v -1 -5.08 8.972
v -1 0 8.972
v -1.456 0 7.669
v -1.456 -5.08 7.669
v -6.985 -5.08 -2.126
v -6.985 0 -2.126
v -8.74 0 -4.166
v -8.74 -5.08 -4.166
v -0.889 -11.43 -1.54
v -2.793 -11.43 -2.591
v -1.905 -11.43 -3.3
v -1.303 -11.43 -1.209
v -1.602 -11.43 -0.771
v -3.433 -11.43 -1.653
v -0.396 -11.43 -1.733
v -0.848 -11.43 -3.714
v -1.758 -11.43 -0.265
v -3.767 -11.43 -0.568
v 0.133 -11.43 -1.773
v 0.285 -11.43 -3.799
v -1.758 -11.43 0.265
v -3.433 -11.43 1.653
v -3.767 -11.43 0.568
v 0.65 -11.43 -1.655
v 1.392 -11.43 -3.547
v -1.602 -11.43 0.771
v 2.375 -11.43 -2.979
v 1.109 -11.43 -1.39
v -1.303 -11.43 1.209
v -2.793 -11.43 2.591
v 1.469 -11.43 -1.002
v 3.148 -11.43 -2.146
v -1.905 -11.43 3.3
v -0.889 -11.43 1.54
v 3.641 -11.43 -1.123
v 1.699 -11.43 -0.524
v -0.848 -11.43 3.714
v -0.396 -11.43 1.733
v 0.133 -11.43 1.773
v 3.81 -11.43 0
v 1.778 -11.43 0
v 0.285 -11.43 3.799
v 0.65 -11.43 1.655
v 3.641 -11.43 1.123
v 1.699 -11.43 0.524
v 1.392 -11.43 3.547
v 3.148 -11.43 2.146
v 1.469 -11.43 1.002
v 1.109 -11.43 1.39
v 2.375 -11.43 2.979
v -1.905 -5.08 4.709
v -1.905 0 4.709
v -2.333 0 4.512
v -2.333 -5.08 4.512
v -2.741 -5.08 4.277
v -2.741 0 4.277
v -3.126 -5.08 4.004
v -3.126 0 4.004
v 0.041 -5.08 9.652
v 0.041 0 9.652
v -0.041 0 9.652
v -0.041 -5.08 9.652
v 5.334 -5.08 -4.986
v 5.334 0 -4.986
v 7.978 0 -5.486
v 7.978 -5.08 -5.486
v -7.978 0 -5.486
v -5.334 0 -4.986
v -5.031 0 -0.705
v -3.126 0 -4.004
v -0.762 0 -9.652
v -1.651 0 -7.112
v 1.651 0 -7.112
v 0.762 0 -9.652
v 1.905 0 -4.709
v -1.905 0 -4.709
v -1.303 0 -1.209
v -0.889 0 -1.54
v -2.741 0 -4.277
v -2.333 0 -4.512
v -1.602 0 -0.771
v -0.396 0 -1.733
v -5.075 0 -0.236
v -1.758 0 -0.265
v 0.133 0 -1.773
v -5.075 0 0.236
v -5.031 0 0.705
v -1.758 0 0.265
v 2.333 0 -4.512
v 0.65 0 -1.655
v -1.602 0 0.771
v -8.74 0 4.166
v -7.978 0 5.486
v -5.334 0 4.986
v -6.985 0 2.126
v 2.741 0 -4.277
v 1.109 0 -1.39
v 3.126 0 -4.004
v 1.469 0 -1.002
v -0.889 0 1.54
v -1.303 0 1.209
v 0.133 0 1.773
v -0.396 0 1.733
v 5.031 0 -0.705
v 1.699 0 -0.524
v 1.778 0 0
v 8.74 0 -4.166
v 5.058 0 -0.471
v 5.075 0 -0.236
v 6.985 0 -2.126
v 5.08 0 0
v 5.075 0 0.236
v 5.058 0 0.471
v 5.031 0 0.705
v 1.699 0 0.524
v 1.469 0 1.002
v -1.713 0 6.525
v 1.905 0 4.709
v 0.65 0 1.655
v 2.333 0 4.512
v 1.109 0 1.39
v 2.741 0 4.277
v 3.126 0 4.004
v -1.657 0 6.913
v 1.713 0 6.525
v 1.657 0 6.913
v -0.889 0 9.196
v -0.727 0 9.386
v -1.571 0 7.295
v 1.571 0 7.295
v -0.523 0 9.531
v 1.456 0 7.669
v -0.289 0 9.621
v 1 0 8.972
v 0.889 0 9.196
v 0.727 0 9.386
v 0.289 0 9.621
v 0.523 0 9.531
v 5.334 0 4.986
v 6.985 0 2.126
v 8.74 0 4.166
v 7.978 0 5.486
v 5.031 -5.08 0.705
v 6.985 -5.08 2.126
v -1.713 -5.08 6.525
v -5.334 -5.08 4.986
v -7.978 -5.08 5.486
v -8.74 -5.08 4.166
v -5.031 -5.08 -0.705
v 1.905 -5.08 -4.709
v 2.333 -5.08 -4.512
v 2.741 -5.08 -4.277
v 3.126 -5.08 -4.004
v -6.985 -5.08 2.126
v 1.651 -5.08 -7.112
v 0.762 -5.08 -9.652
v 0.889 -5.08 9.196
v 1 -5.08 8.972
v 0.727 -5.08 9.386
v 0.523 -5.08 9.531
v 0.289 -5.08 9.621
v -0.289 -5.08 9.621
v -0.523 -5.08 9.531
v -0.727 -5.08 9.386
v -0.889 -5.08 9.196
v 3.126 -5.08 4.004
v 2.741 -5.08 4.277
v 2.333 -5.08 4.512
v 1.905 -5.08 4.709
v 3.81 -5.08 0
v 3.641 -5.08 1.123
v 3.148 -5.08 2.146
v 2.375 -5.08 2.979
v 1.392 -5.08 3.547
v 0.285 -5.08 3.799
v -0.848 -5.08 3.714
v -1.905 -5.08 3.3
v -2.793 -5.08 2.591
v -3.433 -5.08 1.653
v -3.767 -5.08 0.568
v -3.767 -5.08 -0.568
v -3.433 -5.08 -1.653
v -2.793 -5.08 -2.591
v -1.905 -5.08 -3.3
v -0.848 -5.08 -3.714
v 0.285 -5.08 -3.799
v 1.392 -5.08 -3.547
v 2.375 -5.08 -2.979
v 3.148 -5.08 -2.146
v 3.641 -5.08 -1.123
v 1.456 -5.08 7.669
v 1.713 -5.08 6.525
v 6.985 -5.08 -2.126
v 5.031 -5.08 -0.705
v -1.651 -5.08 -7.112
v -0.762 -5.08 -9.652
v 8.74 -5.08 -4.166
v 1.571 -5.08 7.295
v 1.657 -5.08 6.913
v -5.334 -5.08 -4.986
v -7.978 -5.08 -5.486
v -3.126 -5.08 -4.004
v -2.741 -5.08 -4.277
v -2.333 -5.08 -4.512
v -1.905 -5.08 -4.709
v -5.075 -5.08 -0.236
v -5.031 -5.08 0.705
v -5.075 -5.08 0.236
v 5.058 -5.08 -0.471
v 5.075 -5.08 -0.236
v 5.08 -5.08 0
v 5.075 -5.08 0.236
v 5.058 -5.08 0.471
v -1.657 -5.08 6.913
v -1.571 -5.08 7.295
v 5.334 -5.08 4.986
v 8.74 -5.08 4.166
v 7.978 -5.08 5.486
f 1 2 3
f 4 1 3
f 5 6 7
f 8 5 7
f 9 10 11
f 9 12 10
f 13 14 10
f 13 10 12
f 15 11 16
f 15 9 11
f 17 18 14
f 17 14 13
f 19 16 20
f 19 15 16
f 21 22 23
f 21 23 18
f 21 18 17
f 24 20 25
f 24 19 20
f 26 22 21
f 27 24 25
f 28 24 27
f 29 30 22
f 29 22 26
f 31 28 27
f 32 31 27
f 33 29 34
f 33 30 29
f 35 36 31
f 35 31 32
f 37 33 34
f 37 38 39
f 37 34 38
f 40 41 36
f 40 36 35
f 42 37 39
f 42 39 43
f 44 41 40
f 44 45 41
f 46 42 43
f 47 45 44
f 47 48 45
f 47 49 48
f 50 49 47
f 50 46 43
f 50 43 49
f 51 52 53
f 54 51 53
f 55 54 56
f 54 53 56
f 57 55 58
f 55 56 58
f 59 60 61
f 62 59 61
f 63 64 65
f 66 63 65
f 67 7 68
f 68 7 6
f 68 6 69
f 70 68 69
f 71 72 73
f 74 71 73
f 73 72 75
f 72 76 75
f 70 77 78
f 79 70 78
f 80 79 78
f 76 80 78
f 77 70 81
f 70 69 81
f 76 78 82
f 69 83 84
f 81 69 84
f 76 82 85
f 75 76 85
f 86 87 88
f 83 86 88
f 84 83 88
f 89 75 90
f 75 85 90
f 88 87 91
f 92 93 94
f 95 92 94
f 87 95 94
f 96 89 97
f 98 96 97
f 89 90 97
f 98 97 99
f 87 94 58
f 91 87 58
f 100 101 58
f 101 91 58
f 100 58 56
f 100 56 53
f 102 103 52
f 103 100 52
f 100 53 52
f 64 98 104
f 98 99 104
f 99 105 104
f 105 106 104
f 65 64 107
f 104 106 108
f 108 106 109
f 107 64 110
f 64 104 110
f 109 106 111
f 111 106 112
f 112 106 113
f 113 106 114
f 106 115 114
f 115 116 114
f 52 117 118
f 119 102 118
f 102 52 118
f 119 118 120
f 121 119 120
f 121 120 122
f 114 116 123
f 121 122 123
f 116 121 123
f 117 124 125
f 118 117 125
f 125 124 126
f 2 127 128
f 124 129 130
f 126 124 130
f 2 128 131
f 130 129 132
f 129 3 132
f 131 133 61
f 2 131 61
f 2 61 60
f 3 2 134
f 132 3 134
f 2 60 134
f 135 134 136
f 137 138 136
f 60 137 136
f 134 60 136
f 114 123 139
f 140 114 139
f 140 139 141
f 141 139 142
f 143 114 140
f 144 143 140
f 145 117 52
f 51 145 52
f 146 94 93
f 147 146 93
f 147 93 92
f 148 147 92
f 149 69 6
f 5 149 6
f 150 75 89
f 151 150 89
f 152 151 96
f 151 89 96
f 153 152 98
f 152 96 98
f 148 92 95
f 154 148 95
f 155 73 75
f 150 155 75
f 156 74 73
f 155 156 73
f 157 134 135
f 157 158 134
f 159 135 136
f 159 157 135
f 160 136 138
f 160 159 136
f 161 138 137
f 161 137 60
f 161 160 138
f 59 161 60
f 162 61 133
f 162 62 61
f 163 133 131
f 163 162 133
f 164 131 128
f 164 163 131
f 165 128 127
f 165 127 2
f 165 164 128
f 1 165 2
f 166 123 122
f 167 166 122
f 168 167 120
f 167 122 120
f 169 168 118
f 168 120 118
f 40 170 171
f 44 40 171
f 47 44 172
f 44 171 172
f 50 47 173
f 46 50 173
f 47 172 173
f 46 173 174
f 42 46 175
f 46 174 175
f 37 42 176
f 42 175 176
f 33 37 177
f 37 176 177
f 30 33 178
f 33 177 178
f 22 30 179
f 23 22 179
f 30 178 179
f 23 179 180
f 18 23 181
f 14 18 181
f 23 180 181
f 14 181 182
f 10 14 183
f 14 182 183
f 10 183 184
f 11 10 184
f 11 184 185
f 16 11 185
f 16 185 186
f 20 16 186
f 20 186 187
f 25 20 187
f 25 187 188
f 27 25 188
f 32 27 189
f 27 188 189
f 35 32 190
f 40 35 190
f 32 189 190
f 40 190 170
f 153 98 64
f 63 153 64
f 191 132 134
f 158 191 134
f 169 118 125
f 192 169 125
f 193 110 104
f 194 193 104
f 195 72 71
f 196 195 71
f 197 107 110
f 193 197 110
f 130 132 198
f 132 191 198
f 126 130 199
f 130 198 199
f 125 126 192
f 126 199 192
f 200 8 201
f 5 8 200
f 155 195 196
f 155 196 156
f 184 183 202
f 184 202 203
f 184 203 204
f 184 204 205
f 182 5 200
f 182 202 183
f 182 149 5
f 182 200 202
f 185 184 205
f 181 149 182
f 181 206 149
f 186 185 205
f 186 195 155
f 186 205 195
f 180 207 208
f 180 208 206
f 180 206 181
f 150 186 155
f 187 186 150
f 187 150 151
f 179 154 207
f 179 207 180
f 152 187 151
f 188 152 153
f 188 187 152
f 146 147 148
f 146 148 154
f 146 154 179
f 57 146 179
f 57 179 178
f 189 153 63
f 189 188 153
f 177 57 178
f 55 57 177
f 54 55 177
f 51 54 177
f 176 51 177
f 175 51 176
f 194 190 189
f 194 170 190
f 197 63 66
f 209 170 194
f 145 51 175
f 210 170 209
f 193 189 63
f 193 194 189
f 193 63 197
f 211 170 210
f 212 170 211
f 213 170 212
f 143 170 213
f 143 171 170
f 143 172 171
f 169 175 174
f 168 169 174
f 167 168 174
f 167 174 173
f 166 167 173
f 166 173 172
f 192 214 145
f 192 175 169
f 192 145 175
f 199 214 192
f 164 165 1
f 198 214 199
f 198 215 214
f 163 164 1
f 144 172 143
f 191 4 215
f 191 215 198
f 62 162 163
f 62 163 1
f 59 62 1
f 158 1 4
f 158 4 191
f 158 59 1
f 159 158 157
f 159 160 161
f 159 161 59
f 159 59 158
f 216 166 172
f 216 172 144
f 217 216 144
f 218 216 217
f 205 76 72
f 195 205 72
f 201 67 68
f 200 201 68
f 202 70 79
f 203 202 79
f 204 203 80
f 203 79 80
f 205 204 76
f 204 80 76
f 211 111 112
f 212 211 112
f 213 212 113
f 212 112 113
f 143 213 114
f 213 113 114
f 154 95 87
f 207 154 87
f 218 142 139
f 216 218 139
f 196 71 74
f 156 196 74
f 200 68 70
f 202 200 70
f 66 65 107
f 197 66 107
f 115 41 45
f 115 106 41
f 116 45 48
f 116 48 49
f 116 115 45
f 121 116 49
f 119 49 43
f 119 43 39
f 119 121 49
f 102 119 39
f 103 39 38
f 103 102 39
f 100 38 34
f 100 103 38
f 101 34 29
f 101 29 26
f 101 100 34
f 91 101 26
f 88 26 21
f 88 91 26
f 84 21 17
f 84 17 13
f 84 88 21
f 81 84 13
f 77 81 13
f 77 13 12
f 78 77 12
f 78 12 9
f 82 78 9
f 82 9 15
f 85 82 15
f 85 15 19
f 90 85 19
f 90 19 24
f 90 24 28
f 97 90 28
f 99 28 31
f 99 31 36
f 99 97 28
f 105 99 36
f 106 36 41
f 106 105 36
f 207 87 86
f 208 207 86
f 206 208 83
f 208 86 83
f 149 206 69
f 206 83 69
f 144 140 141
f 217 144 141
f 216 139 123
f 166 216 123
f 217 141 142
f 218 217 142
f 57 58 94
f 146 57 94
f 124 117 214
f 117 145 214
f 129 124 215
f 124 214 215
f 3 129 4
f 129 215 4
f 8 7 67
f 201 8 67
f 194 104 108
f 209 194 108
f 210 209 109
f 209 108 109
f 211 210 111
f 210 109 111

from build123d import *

# Parameters (mm, degrees)
F0_R     = 1.778
F1_DEPTH = 5.08
F2_R     = 3.81
F2_R_2   = 1.778
F3_DEPTH = 6.35
F4_R     = 5.08
F5_R     = 1.016


# Not quite as in the source:
# - a feature names something its author has since deleted; it is built from what else it names


with BuildPart() as f1:
    # F0 (on Front) → F1 (new body)
    with BuildSketch(Plane.XZ):
        with BuildLine():
            ThreePointArc((5.0308613437, -0.7048646254), (5.0677004463, -0.353287683), (5.08, 0))
            ThreePointArc((5.08, 0), (5.0677004463, 0.353287683), (5.0308613437, 0.7048646254))
            ThreePointArc((5.0308613437, 0.7048646254), (4.3994090512, 2.54), (3.1258613437, 4.0044214139))
            ThreePointArc((3.1258613437, 4.0044214139), (2.54, 4.3994090512), (1.905, 4.7092860393))
            ThreePointArc((1.905, 4.7092860393), (0, 5.08), (-1.905, 4.7092860393))
            ThreePointArc((-1.905, 4.7092860393), (-2.54, 4.3994090512), (-3.1258613437, 4.0044214139))
            ThreePointArc((-3.1258613437, 4.0044214139), (-4.3994090512, 2.54), (-5.0308613437, 0.7048646254))
            ThreePointArc((-5.0308613437, 0.7048646254), (-5.08, 0), (-5.0308613437, -0.7048646254))
            ThreePointArc((-5.0308613437, -0.7048646254), (-4.3994090512, -2.54), (-3.1258613437, -4.0044214139))
            ThreePointArc((-3.1258613437, -4.0044214139), (-2.54, -4.3994090512), (-1.905, -4.7092860393))
            ThreePointArc((-1.905, -4.7092860393), (0, -5.08), (1.905, -4.7092860393))
            ThreePointArc((1.905, -4.7092860393), (2.54, -4.3994090512), (3.1258613437, -4.0044214139))
            ThreePointArc((3.1258613437, -4.0044214139), (4.3994090512, -2.54), (5.0308613437, -0.7048646254))
        make_face()
        Circle(F0_R, mode=Mode.SUBTRACT)
        with BuildLine():
            ThreePointArc((3.1258613437, 4.0044214139), (4.3994090512, 2.54), (5.0308613437, 0.7048646254))
            Line((5.0308613437, 0.7048646254), (6.9846726717, 2.1261920584))
            Line((6.9846726717, 2.1261920584), (8.7398771973, 4.1660886423))
            Line((8.7398771973, 4.1660886423), (7.9778771973, 5.4859113577))
            Line((7.9778771973, 5.4859113577), (5.3336726717, 4.9858079416))
            Line((5.3336726717, 4.9858079416), (3.1258613437, 4.0044214139))
        make_face()
        with BuildLine():
            Line((6.9846726717, -2.1261920584), (5.0308613437, -0.7048646254))
            ThreePointArc((5.0308613437, -0.7048646254), (4.3994090512, -2.54), (3.1258613437, -4.0044214139))
            Line((3.1258613437, -4.0044214139), (5.3336726717, -4.9858079416))
            Line((5.3336726717, -4.9858079416), (7.9778771973, -5.4859113577))
            Line((7.9778771973, -5.4859113577), (8.7398771973, -4.1660886423))
            Line((8.7398771973, -4.1660886423), (6.9846726717, -2.1261920584))
        make_face()
        with BuildLine():
            ThreePointArc((-1.905, 4.7092860393), (0, 5.08), (1.905, 4.7092860393))
            Line((1.905, 4.7092860393), (1.651, 7.112))
            Line((1.651, 7.112), (0.762, 9.652))
            Line((0.762, 9.652), (-0.762, 9.652))
            Line((-0.762, 9.652), (-1.651, 7.112))
            Line((-1.651, 7.112), (-1.905, 4.7092860393))
        make_face()
        with BuildLine():
            Line((1.651, -7.112), (1.905, -4.7092860393))
            ThreePointArc((1.905, -4.7092860393), (0, -5.08), (-1.905, -4.7092860393))
            Line((-1.905, -4.7092860393), (-1.651, -7.112))
            Line((-1.651, -7.112), (-0.762, -9.652))
            Line((-0.762, -9.652), (0.762, -9.652))
            Line((0.762, -9.652), (1.651, -7.112))
        make_face()
        with BuildLine():
            ThreePointArc((-5.0308613437, 0.7048646254), (-4.3994090512, 2.54), (-3.1258613437, 4.0044214139))
            Line((-3.1258613437, 4.0044214139), (-5.3336726717, 4.9858079416))
            Line((-5.3336726717, 4.9858079416), (-7.9778771973, 5.4859113577))
            Line((-7.9778771973, 5.4859113577), (-8.7398771973, 4.1660886423))
            Line((-8.7398771973, 4.1660886423), (-6.9846726717, 2.1261920584))
            Line((-6.9846726717, 2.1261920584), (-5.0308613437, 0.7048646254))
        make_face()
        with BuildLine():
            Line((-5.3336726717, -4.9858079416), (-3.1258613437, -4.0044214139))
            ThreePointArc((-3.1258613437, -4.0044214139), (-4.3994090512, -2.54), (-5.0308613437, -0.7048646254))
            Line((-5.0308613437, -0.7048646254), (-6.9846726717, -2.1261920584))
            Line((-6.9846726717, -2.1261920584), (-8.7398771973, -4.1660886423))
            Line((-8.7398771973, -4.1660886423), (-7.9778771973, -5.4859113577))
            Line((-7.9778771973, -5.4859113577), (-5.3336726717, -4.9858079416))
        make_face()
    extrude(amount=F1_DEPTH)

    # F2 (on face) → F3 (join)
    with BuildSketch(Plane.XZ.offset(5.08)):
        Circle(F2_R)
        Circle(F2_R_2, mode=Mode.SUBTRACT)
    extrude(amount=F3_DEPTH)

    # F4
    f4_edges = [f1.edges().sort_by_distance(p)[0] for p in [
        (1.651, -2.54, 7.112),
        (-1.651, -2.54, 7.112),
    ]]
    fillet(f4_edges, radius=F4_R)

    # F5
    f5_edges = [f1.edges().sort_by_distance(p)[0] for p in [
        (0.762, -2.54, 9.652),
        (-0.762, -2.54, 9.652),
    ]]
    fillet(f5_edges, radius=F5_R)


solid = f1.part
